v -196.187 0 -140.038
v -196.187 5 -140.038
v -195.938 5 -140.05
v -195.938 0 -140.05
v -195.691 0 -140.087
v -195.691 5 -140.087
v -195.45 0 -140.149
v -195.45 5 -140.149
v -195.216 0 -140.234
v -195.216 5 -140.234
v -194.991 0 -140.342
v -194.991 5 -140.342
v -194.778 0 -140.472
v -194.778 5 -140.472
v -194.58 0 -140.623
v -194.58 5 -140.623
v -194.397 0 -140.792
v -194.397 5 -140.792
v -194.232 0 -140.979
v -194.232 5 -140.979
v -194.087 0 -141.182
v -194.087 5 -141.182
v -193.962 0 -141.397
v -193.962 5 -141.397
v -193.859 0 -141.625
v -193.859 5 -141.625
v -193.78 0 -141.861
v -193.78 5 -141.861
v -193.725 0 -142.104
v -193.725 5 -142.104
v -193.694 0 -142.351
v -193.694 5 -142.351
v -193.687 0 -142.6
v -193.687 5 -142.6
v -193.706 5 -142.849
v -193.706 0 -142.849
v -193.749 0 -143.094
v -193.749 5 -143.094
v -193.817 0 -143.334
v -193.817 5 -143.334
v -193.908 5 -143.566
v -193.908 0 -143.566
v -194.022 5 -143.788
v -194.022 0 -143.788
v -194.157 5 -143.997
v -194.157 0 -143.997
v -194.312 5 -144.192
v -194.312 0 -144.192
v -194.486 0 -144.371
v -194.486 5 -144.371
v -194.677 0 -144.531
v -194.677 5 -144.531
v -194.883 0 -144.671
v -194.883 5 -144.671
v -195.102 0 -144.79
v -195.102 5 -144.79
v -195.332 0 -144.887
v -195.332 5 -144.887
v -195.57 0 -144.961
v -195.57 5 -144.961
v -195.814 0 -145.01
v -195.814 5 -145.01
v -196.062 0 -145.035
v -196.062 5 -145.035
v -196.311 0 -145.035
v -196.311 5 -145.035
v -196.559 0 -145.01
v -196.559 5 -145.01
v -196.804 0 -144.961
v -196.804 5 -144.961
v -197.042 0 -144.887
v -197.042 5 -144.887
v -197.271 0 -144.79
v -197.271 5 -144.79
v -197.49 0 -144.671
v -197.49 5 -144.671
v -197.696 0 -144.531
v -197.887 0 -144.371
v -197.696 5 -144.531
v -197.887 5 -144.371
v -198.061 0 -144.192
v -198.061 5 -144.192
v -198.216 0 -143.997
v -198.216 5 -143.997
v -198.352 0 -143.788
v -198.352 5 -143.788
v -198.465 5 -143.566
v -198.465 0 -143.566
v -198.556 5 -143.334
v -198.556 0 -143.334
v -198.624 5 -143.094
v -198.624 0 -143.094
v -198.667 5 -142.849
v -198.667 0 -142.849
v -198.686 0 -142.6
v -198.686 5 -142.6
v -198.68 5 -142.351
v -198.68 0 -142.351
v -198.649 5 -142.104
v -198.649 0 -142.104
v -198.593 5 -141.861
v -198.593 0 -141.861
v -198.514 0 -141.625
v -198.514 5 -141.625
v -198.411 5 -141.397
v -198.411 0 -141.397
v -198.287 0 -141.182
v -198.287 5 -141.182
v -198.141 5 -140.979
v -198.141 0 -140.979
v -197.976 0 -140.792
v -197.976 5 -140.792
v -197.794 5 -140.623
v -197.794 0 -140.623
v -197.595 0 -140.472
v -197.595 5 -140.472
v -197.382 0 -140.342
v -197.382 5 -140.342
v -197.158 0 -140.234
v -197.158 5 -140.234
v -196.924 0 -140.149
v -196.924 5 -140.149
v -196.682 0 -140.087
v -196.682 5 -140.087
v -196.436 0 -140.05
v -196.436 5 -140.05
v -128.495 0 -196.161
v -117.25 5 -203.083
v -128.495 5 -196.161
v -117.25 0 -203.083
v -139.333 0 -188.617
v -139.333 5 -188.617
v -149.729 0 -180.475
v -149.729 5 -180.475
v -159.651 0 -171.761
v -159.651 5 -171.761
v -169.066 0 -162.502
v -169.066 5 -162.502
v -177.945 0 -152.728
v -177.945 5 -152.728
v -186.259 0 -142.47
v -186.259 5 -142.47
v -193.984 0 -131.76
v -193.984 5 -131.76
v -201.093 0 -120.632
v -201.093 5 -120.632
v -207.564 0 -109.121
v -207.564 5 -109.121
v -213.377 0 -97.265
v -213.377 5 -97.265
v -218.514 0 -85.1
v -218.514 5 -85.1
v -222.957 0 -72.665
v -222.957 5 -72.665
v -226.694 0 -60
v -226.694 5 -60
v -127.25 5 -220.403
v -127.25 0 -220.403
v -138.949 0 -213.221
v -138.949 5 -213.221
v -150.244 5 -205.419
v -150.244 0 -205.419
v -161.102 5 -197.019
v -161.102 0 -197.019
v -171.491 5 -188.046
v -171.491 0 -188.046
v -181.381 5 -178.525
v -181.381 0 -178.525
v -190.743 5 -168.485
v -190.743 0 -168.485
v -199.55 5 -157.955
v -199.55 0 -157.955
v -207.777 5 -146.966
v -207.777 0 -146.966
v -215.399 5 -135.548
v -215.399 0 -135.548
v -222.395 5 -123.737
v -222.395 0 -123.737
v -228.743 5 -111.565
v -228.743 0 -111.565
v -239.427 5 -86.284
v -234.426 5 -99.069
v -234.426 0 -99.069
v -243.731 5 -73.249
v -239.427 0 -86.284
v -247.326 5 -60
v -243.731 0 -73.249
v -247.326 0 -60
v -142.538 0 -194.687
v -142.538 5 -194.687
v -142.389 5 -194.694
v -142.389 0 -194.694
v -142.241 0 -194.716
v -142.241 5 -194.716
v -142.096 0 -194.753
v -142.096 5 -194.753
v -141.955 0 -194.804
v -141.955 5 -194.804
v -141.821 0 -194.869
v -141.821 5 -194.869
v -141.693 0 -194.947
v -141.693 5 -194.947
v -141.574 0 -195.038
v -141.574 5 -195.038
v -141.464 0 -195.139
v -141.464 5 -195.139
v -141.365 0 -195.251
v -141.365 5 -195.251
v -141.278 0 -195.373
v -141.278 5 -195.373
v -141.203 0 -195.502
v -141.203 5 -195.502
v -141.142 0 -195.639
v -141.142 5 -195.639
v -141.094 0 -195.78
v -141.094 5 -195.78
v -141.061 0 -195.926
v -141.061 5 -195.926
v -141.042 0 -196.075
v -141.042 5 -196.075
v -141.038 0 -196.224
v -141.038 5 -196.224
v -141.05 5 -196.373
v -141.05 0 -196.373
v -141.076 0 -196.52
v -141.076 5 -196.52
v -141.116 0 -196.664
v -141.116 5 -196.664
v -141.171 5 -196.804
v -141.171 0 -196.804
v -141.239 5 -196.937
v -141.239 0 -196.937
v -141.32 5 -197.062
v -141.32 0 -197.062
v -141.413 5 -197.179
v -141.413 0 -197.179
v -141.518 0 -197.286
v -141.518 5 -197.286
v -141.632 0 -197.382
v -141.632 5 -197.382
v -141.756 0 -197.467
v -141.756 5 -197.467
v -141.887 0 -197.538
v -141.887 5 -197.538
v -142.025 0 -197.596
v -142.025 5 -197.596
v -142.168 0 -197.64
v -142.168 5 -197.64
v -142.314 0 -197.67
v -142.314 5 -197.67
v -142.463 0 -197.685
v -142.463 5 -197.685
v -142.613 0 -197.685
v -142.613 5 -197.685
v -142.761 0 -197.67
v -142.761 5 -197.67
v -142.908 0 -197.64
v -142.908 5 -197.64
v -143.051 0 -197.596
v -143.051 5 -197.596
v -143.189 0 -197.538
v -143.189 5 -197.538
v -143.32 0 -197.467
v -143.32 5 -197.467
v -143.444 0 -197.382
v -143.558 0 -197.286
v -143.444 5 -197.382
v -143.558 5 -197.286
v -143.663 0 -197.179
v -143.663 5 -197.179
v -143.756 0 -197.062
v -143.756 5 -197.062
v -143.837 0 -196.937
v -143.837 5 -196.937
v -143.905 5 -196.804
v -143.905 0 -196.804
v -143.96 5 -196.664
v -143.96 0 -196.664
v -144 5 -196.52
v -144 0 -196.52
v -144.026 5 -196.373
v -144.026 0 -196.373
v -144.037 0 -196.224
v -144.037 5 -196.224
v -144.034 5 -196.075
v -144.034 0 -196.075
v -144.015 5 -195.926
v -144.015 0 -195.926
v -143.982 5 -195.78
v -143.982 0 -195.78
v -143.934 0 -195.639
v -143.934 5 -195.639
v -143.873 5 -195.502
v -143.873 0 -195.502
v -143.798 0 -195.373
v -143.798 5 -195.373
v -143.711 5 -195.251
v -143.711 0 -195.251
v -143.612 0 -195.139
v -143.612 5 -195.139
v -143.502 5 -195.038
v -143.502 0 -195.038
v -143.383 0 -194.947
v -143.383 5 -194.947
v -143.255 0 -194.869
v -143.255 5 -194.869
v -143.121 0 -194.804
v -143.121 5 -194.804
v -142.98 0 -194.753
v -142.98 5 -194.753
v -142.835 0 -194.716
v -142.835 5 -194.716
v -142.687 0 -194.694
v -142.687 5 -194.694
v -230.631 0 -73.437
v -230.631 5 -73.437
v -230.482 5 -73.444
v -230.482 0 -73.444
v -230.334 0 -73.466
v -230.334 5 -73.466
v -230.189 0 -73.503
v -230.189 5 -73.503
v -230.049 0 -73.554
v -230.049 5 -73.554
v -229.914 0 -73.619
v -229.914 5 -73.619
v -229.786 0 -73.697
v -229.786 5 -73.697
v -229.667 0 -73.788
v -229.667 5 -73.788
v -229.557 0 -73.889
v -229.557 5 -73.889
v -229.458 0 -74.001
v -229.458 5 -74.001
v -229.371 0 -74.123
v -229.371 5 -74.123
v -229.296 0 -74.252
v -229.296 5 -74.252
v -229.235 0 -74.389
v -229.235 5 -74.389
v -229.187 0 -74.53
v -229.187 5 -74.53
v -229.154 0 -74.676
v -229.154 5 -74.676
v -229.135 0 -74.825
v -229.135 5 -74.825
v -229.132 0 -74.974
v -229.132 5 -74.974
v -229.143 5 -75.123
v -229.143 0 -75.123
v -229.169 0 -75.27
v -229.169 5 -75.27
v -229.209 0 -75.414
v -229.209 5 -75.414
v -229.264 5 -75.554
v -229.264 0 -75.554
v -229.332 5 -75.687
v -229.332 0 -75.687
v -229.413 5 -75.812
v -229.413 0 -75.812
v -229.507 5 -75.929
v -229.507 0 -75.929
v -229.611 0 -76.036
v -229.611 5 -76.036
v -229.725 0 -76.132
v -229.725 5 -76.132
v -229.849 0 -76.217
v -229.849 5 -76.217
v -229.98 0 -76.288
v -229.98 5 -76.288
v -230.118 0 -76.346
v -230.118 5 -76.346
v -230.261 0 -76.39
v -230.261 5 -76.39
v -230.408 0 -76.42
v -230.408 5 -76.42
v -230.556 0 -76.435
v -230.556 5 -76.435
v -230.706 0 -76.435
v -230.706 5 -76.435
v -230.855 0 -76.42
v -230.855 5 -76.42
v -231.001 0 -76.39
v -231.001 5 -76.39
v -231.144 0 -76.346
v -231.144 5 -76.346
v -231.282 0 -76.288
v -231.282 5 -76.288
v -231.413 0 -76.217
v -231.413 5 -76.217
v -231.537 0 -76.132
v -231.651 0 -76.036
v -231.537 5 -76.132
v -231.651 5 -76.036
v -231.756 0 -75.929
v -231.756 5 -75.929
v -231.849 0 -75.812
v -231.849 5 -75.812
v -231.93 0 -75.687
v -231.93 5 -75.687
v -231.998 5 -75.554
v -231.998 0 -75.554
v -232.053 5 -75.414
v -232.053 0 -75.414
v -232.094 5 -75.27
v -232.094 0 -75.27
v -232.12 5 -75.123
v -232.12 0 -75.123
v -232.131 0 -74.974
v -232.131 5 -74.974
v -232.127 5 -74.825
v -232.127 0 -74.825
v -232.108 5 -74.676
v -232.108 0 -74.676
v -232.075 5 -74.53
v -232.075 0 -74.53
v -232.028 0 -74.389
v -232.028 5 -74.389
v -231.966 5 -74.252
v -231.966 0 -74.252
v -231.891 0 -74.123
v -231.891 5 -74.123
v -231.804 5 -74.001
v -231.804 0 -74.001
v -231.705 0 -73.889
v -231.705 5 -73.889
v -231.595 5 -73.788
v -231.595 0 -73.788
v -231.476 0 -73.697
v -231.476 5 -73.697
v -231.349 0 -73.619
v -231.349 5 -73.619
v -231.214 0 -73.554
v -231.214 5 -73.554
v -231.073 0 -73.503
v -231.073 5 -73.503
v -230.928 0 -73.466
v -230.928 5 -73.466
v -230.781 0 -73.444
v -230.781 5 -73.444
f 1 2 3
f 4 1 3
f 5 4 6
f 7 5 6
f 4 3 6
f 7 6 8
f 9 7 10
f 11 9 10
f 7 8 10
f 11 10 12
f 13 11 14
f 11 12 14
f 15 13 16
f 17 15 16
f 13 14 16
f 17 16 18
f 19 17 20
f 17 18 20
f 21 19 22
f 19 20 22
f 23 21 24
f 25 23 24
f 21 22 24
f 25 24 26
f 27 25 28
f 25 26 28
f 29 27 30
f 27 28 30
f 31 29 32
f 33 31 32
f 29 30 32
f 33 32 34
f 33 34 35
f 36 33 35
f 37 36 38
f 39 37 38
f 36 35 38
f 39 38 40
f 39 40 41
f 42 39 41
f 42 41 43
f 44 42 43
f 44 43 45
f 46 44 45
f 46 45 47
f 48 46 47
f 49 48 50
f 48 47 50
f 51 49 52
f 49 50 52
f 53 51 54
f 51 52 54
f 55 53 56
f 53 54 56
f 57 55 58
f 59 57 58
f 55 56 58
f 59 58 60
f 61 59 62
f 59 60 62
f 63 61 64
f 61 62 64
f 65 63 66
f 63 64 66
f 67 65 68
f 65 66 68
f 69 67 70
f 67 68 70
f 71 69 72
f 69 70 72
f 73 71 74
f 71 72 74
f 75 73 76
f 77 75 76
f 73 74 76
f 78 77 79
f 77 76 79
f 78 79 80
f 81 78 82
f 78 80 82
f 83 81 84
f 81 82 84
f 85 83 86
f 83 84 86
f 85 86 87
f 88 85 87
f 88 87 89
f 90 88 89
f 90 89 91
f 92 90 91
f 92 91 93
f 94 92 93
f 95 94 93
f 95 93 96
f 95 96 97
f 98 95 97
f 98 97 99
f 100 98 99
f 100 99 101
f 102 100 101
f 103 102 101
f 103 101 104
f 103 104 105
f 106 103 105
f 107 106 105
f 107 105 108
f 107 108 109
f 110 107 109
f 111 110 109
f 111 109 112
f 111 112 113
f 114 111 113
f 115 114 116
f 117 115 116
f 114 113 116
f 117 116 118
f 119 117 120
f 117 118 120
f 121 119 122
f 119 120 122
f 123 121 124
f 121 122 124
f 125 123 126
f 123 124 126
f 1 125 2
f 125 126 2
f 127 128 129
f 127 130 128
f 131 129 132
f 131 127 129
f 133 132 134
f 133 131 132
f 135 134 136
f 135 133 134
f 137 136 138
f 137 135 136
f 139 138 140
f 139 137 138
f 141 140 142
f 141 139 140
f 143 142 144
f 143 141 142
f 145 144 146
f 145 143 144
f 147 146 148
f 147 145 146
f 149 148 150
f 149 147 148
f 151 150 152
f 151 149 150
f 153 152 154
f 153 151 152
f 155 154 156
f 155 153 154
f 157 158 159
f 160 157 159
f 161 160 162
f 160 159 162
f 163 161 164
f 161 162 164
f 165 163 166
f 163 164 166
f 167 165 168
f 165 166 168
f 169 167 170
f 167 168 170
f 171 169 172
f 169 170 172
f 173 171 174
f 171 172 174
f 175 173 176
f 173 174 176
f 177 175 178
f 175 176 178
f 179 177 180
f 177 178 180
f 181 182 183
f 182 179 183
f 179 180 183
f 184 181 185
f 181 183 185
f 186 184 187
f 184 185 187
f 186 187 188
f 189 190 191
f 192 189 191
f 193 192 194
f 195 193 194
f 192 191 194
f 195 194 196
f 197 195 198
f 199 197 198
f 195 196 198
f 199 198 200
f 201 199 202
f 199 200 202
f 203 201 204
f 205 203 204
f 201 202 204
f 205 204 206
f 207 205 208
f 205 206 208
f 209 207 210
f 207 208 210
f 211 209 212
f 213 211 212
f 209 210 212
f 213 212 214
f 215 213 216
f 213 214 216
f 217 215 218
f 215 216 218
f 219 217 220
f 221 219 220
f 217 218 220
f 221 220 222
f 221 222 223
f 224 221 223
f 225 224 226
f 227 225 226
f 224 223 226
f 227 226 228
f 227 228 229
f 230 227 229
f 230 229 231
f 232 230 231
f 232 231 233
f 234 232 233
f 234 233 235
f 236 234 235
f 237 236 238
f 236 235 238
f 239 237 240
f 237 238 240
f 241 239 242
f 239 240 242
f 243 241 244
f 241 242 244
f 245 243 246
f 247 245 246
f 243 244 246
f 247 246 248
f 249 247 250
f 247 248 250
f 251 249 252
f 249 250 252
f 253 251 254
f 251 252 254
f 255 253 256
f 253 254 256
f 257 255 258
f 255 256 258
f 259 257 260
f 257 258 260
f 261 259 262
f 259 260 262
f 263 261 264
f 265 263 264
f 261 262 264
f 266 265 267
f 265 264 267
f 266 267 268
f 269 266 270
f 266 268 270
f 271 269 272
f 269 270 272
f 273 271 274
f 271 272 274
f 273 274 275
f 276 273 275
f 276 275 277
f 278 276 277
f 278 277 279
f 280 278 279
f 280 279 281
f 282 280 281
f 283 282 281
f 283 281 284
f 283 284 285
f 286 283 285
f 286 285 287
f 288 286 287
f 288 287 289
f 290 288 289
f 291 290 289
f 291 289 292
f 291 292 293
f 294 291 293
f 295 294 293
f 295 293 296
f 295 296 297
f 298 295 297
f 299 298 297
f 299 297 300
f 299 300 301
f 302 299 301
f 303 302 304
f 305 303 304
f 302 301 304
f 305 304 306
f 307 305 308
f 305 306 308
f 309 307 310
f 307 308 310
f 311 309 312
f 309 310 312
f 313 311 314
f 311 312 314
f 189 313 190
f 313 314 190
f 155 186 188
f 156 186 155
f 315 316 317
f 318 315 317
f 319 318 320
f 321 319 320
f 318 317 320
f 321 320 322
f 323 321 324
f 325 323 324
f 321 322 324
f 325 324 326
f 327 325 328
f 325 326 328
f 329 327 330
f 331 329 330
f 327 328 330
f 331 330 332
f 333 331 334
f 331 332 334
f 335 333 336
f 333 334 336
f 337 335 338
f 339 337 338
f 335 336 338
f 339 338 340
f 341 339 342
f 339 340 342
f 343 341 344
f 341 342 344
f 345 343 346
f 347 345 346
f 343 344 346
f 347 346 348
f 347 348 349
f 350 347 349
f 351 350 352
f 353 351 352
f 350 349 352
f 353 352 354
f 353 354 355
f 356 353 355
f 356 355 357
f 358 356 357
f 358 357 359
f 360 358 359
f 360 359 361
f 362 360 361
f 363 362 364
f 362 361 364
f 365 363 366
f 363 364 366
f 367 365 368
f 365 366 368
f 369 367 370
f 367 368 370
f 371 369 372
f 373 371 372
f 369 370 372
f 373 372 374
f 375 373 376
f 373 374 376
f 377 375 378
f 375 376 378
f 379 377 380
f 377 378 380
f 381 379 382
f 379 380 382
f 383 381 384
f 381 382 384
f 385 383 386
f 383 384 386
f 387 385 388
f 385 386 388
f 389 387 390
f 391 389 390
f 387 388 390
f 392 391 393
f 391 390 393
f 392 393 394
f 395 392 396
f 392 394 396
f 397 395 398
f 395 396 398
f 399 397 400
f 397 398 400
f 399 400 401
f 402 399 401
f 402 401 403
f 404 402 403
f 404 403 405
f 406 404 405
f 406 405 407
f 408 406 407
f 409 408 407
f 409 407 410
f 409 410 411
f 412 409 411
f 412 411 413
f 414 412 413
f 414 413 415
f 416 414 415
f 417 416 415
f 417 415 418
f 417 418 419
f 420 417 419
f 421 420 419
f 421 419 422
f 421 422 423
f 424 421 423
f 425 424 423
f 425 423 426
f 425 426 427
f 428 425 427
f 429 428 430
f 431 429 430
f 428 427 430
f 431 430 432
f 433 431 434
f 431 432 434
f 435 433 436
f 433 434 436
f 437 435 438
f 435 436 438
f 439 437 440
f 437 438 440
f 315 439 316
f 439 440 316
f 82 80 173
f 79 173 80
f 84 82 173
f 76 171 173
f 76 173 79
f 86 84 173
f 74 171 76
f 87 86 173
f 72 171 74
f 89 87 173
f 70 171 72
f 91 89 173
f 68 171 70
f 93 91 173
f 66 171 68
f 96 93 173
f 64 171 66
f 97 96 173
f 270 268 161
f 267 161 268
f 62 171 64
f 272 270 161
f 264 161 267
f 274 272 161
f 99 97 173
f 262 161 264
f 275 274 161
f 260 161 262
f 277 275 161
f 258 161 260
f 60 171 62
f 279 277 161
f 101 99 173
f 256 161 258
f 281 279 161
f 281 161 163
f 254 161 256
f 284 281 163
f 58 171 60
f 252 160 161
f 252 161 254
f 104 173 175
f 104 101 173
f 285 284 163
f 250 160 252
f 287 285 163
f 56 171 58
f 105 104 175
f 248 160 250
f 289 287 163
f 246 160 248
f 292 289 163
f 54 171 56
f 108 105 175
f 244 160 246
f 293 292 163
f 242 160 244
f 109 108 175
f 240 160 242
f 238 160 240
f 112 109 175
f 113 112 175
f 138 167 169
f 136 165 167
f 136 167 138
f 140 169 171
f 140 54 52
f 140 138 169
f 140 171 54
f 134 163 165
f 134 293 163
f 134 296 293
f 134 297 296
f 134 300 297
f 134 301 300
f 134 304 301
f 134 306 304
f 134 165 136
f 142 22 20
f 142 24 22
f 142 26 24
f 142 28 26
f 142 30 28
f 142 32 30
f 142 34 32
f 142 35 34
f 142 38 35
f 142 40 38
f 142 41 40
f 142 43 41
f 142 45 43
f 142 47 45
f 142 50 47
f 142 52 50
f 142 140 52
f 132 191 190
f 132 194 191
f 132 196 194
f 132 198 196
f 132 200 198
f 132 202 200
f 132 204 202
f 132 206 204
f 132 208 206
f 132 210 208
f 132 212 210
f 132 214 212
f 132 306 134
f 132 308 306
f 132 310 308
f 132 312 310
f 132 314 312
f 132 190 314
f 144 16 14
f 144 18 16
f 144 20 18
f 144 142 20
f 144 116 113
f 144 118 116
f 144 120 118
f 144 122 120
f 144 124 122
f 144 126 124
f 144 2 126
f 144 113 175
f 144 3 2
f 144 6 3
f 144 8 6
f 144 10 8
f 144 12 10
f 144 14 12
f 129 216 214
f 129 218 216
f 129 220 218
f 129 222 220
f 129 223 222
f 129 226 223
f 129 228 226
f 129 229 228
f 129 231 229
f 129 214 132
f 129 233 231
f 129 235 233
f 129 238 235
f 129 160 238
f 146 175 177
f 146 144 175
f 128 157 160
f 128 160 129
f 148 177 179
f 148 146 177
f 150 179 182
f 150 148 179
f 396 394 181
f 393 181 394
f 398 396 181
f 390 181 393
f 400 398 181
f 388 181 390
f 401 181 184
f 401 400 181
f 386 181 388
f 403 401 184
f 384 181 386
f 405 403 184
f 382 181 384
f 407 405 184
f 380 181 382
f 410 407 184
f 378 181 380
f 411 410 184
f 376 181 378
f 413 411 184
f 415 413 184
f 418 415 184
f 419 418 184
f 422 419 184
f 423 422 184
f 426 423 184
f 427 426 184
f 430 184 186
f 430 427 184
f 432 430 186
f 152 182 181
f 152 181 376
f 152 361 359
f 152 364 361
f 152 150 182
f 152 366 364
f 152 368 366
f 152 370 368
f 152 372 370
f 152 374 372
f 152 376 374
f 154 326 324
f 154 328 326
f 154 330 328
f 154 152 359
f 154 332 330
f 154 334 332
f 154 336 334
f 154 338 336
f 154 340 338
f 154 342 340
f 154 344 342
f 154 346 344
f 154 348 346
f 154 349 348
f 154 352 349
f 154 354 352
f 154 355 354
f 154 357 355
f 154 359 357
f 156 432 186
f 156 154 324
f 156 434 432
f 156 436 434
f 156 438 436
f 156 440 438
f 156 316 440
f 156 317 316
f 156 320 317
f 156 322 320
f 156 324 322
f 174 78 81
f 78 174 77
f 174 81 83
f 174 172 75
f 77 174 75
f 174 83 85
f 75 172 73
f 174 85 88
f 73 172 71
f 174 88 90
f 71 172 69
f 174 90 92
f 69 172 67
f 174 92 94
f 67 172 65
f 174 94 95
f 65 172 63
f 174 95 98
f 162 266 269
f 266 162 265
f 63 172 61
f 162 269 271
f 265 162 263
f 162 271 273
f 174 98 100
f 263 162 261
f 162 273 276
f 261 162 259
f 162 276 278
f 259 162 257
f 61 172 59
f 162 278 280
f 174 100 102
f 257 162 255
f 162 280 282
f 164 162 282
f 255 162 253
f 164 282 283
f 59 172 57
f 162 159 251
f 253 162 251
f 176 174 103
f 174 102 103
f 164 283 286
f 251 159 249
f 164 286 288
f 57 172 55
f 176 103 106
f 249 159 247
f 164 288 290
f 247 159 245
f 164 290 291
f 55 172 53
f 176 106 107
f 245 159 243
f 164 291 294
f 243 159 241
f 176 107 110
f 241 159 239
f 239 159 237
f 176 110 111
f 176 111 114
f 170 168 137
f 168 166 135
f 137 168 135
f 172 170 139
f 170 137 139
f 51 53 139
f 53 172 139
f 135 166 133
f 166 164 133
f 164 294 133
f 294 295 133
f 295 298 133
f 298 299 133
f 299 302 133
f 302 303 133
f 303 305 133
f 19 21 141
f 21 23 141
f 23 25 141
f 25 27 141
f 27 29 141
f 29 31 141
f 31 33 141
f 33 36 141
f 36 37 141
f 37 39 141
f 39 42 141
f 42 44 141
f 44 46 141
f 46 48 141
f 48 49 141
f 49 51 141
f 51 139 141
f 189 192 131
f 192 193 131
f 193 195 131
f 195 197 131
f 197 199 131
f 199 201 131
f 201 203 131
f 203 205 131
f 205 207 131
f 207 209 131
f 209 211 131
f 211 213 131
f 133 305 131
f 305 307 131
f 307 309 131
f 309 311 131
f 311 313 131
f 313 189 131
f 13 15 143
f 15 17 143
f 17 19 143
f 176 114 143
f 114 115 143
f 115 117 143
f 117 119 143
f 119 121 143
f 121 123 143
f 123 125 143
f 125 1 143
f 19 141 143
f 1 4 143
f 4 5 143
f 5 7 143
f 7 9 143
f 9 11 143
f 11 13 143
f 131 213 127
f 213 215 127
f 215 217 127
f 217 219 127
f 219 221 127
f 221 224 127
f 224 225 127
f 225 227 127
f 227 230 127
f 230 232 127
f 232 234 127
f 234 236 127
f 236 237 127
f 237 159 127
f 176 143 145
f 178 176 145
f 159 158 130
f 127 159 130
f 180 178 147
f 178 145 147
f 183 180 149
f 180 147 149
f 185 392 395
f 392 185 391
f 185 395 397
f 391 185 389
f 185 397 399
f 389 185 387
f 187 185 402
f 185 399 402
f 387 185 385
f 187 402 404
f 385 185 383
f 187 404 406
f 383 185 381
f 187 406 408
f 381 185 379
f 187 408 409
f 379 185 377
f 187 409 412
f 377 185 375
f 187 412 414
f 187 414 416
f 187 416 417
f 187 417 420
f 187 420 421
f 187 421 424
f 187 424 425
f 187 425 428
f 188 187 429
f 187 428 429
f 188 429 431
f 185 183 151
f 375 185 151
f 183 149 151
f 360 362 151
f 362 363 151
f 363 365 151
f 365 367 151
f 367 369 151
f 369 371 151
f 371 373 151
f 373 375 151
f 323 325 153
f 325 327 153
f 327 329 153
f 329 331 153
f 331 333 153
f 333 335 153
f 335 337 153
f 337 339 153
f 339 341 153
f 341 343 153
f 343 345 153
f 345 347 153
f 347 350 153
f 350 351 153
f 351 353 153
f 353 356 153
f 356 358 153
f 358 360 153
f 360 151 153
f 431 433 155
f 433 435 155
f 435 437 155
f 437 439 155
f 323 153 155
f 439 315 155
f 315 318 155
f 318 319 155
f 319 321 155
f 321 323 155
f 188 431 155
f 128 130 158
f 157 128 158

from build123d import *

# Parameters (mm, degrees)
SKETCH1_R           = 254.5
SKETCH1_R_2         = 234.5
BOSS_EXTRUDE1_DEPTH = 5
SKETCH2_W           = 27.805822748
SKETCH2_H           = 60
CUT_EXTRUDE1_DEPTH  = 5
SKETCH3_R           = 2.5
CUT_EXTRUDE2_DEPTH  = 5
SKETCH4_R           = 1.5
CUT_EXTRUDE3_DEPTH  = 5
SKETCH5_W           = 651.212620435
SKETCH5_H           = 357.226439325
CUT_EXTRUDE4_DEPTH  = 10
CUT_EXTRUDE5_START  = -10
CUT_EXTRUDE5_DEPTH  = 10


with BuildPart() as part:
    # Sketch1 → Boss-Extrude1 (new body)
    with BuildSketch(Plane(origin=(0, 0, 0), x_dir=(1, 0, 0), z_dir=(0, 1, 0))):
        with Locations(Location((0, 0, 0), (0, 0, 270))):
            Circle(SKETCH1_R)
        with Locations(Location((0, 0, 0), (0, 0, 270))):
            Circle(SKETCH1_R_2, mode=Mode.SUBTRACT)
    extrude(amount=BOSS_EXTRUDE1_DEPTH)

    # Sketch2 → Cut-Extrude1 (cut)
    with BuildSketch(Plane(origin=(0, 5, 0), x_dir=(1, 0, 0), z_dir=(0, 1, 0))):
        with Locations((-240.597088626, 30)):
            Rectangle(SKETCH2_W, SKETCH2_H)
    cut_extrude1 = extrude(amount=-CUT_EXTRUDE1_DEPTH, mode=Mode.SUBTRACT)

    # Mirror1: Cut-Extrude1 across plane
    add(cut_extrude1.mirror(Plane.XY), mode=Mode.SUBTRACT)

    # Sketch3 → Cut-Extrude2 (cut)
    with BuildSketch(Plane(origin=(0, 5, 0), x_dir=(1, 0, 0), z_dir=(0, 1, 0))):
        with Locations(Location((242.5, 0, 0), (0, 0, 270))):
            Circle(SKETCH3_R)
        with Locations(Location((196.186621136, -142.537923681, 0), (0, 0, 270))):
            Circle(SKETCH3_R)
        with Locations(Location((74.936621136, -230.631205202, 0), (0, 0, 270))):
            Circle(SKETCH3_R)
        with Locations(Location((-74.936621136, -230.631205202, 0), (0, 0, 270))):
            Circle(SKETCH3_R)
        with Locations(Location((-196.186621136, -142.537923681, 0), (0, 0, 270))):
            Circle(SKETCH3_R)
        with Locations((-242.5, 0)):
            Circle(SKETCH3_R)
        with Locations(Location((-196.186621136, 142.537923681, 0), (0, 0, 270))):
            Circle(SKETCH3_R)
        with Locations(Location((-74.936621136, 230.631205202, 0), (0, 0, 270))):
            Circle(SKETCH3_R)
        with Locations(Location((74.936621136, 230.631205202, 0), (0, 0, 270))):
            Circle(SKETCH3_R)
        with Locations(Location((196.186621136, 142.537923681, 0), (0, 0, 270))):
            Circle(SKETCH3_R)
    extrude(amount=-CUT_EXTRUDE2_DEPTH, mode=Mode.SUBTRACT)

    # Sketch4 → Cut-Extrude3 (cut)
    with BuildSketch(Plane(origin=(0, 5, 0), x_dir=(1, 0, 0), z_dir=(0, 1, 0))):
        with Locations(Location((0, -242.5, 0), (0, 0, 270))):
            Circle(SKETCH4_R)
        with Locations(Location((-142.537923681, -196.186621136, 0), (0, 0, 270))):
            Circle(SKETCH4_R)
        with Locations(Location((-230.631205202, -74.936621136, 0), (0, 0, 270))):
            Circle(SKETCH4_R)
        with Locations(Location((-230.631205202, 74.936621136, 0), (0, 0, 270))):
            Circle(SKETCH4_R)
        with Locations(Location((-142.537923681, 196.186621136, 0), (0, 0, 270))):
            Circle(SKETCH4_R)
        with Locations(Location((0, 242.5, 0), (0, 0, 270))):
            Circle(SKETCH4_R)
        with Locations(Location((142.537923681, 196.186621136, 0), (0, 0, 270))):
            Circle(SKETCH4_R)
        with Locations(Location((230.631205202, 74.936621136, 0), (0, 0, 270))):
            Circle(SKETCH4_R)
        with Locations(Location((230.631205202, -74.936621136, 0), (0, 0, 270))):
            Circle(SKETCH4_R)
        with Locations(Location((142.537923681, -196.186621136, 0), (0, 0, 270))):
            Circle(SKETCH4_R)
    extrude(amount=-CUT_EXTRUDE3_DEPTH, mode=Mode.SUBTRACT)

    # Sketch5 → Cut-Extrude4 (cut)
    with BuildSketch(Plane(origin=(0, 5, 0), x_dir=(1, 0, 0), z_dir=(0, 1, 0))):
        with Locations((-71.106310217, -178.613219663)):
            Rectangle(SKETCH5_W, SKETCH5_H)
    extrude(amount=-CUT_EXTRUDE4_DEPTH, mode=Mode.SUBTRACT)

    # Sketch6 → Cut-Extrude5 (cut)
    with BuildSketch(Plane(origin=(0, 5, 0), x_dir=(1, 0, 0), z_dir=(0, 1, 0)).offset(CUT_EXTRUDE5_START)):
        with BuildLine():
            Line((254.5, 0), (0, 0))
            Line((0, 0), (-127.25, 220.403465263))
            ThreePointArc((-127.25, 220.403465263), (127.25, 220.403465263), (254.5, 0))
        make_face()
    extrude(amount=CUT_EXTRUDE5_DEPTH, mode=Mode.SUBTRACT)


solid = part.part
